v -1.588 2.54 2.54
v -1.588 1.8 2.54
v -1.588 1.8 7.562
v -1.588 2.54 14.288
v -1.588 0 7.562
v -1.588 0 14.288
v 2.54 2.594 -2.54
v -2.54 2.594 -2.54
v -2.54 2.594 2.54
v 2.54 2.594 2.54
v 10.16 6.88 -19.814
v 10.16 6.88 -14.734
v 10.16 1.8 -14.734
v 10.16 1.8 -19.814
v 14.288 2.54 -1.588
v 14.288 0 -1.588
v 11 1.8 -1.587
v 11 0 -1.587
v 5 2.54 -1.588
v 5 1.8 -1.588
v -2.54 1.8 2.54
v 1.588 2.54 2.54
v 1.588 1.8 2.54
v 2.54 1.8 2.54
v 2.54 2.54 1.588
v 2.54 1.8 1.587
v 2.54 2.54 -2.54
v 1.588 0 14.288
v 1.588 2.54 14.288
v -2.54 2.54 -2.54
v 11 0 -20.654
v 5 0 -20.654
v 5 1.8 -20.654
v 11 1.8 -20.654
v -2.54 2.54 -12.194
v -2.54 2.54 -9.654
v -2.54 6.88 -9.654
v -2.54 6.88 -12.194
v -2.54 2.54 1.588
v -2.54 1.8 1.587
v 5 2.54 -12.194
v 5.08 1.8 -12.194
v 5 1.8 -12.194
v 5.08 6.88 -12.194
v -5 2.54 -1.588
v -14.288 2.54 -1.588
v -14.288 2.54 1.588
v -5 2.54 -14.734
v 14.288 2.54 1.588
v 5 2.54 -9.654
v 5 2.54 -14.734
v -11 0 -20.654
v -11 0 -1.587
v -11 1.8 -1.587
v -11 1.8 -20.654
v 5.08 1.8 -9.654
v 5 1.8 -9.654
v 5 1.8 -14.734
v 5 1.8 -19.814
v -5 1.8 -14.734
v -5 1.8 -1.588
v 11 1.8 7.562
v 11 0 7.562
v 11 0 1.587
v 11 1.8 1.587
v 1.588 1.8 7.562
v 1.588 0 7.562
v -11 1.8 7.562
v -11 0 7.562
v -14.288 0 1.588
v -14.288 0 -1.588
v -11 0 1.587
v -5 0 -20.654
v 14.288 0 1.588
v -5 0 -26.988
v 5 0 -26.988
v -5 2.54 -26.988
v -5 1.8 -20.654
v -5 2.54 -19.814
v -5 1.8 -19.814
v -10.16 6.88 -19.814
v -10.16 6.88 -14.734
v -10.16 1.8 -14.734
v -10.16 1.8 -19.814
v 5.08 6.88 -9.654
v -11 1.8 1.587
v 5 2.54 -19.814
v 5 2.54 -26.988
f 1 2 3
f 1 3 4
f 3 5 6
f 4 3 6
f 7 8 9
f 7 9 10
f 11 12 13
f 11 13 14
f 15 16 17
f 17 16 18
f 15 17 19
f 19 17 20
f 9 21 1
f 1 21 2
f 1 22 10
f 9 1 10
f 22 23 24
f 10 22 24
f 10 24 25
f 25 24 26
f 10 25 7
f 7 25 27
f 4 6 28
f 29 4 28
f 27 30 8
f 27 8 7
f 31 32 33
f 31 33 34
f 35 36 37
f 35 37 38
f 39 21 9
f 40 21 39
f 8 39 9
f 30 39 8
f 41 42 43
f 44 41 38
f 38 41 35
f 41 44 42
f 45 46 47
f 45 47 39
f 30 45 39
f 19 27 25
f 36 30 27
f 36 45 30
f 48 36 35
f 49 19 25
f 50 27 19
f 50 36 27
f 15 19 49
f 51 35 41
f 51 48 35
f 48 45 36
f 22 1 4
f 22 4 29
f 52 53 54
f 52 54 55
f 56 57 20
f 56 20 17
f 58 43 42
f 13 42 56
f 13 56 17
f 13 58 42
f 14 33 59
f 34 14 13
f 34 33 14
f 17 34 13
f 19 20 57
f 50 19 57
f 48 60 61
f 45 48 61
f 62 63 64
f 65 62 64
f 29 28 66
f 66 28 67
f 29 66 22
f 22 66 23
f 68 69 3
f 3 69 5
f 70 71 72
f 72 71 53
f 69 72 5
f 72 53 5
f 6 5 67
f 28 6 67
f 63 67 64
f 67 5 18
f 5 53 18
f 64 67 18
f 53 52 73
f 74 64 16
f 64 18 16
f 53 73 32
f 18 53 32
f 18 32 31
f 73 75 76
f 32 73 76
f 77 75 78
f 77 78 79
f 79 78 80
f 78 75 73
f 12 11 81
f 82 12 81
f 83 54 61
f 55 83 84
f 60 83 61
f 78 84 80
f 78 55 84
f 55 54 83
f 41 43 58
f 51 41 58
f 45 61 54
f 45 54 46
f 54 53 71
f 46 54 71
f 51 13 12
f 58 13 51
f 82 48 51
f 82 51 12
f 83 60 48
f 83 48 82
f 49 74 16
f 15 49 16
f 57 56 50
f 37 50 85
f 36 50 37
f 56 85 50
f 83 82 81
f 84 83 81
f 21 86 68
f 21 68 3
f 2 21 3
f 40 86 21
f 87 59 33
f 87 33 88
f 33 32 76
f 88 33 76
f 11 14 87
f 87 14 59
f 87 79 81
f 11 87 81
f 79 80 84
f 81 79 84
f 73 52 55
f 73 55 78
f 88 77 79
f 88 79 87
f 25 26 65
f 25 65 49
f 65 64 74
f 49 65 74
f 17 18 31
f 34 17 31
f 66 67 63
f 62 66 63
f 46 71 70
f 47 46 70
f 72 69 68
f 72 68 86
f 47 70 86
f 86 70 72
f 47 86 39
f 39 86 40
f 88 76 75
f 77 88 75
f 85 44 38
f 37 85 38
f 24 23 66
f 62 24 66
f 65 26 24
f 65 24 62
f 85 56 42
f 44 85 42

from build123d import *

# Parameters (mm, degrees)
SKETCH1_W           = 22
SKETCH1_H           = 28.216692514
BOSS_EXTRUDE1_DEPTH = 1.8
BOSS_EXTRUDE4_DEPTH = 2.54
SKETCH2_W           = 5.08
SKETCH2_H           = 5.08
BOSS_EXTRUDE2_DEPTH = 0.79375
BOSS_EXTRUDE3_START = -1.8
SKETCH3_W           = 7.62
SKETCH3_H           = 2.54
SKETCH3_W_2         = 20.32
SKETCH3_H_2         = 5.08
BOSS_EXTRUDE3_DEPTH = 5.08


with BuildPart() as part:
    # Sketch1 → Boss-Extrude1 (new body)
    with BuildSketch(Plane(origin=(0, 0, 0), x_dir=(1, 0, 0), z_dir=(0, 1, 0))):
        with Locations((0, 6.545846257)):
            Rectangle(SKETCH1_W, SKETCH1_H)
    extrude(amount=BOSS_EXTRUDE1_DEPTH)

    # Sketch4 → Boss-Extrude4 (add)
    with BuildSketch(Plane(origin=(0, 0, 0), x_dir=(1, 0, 0), z_dir=(0, 1, 0))):
        Polygon((-14.2875, -1.5875), (-1.5875, -1.5875), (-1.5875, -14.2875), (1.5875, -14.2875), (1.5875, -1.5875), (14.2875, -1.5875), (14.2875, 1.5875), (5, 1.5875), (5, 26.9875), (-5, 26.9875), (-5, 1.5875), (-14.2875, 1.5875), align=None)
    extrude(amount=BOSS_EXTRUDE4_DEPTH)

    # Sketch2 → Boss-Extrude2 (add)
    with BuildSketch(Plane(origin=(0, 1.8, 0), x_dir=(1, 0, 0), z_dir=(0, 1, 0))):
        Rectangle(SKETCH2_W, SKETCH2_H)
    extrude(amount=BOSS_EXTRUDE2_DEPTH)

    # Sketch3 → Boss-Extrude3 (add)
    with BuildSketch(Plane(origin=(0, 0, 0), x_dir=(-1, 0, 0), z_dir=(0, -1, 0)).offset(BOSS_EXTRUDE3_START)):
        with Locations((-1.27, 10.924192514)):
            Rectangle(SKETCH3_W, SKETCH3_H)
        with Locations((0, 17.274192514)):
            Rectangle(SKETCH3_W_2, SKETCH3_H_2)
    extrude(amount=-BOSS_EXTRUDE3_DEPTH)


solid = part.part
